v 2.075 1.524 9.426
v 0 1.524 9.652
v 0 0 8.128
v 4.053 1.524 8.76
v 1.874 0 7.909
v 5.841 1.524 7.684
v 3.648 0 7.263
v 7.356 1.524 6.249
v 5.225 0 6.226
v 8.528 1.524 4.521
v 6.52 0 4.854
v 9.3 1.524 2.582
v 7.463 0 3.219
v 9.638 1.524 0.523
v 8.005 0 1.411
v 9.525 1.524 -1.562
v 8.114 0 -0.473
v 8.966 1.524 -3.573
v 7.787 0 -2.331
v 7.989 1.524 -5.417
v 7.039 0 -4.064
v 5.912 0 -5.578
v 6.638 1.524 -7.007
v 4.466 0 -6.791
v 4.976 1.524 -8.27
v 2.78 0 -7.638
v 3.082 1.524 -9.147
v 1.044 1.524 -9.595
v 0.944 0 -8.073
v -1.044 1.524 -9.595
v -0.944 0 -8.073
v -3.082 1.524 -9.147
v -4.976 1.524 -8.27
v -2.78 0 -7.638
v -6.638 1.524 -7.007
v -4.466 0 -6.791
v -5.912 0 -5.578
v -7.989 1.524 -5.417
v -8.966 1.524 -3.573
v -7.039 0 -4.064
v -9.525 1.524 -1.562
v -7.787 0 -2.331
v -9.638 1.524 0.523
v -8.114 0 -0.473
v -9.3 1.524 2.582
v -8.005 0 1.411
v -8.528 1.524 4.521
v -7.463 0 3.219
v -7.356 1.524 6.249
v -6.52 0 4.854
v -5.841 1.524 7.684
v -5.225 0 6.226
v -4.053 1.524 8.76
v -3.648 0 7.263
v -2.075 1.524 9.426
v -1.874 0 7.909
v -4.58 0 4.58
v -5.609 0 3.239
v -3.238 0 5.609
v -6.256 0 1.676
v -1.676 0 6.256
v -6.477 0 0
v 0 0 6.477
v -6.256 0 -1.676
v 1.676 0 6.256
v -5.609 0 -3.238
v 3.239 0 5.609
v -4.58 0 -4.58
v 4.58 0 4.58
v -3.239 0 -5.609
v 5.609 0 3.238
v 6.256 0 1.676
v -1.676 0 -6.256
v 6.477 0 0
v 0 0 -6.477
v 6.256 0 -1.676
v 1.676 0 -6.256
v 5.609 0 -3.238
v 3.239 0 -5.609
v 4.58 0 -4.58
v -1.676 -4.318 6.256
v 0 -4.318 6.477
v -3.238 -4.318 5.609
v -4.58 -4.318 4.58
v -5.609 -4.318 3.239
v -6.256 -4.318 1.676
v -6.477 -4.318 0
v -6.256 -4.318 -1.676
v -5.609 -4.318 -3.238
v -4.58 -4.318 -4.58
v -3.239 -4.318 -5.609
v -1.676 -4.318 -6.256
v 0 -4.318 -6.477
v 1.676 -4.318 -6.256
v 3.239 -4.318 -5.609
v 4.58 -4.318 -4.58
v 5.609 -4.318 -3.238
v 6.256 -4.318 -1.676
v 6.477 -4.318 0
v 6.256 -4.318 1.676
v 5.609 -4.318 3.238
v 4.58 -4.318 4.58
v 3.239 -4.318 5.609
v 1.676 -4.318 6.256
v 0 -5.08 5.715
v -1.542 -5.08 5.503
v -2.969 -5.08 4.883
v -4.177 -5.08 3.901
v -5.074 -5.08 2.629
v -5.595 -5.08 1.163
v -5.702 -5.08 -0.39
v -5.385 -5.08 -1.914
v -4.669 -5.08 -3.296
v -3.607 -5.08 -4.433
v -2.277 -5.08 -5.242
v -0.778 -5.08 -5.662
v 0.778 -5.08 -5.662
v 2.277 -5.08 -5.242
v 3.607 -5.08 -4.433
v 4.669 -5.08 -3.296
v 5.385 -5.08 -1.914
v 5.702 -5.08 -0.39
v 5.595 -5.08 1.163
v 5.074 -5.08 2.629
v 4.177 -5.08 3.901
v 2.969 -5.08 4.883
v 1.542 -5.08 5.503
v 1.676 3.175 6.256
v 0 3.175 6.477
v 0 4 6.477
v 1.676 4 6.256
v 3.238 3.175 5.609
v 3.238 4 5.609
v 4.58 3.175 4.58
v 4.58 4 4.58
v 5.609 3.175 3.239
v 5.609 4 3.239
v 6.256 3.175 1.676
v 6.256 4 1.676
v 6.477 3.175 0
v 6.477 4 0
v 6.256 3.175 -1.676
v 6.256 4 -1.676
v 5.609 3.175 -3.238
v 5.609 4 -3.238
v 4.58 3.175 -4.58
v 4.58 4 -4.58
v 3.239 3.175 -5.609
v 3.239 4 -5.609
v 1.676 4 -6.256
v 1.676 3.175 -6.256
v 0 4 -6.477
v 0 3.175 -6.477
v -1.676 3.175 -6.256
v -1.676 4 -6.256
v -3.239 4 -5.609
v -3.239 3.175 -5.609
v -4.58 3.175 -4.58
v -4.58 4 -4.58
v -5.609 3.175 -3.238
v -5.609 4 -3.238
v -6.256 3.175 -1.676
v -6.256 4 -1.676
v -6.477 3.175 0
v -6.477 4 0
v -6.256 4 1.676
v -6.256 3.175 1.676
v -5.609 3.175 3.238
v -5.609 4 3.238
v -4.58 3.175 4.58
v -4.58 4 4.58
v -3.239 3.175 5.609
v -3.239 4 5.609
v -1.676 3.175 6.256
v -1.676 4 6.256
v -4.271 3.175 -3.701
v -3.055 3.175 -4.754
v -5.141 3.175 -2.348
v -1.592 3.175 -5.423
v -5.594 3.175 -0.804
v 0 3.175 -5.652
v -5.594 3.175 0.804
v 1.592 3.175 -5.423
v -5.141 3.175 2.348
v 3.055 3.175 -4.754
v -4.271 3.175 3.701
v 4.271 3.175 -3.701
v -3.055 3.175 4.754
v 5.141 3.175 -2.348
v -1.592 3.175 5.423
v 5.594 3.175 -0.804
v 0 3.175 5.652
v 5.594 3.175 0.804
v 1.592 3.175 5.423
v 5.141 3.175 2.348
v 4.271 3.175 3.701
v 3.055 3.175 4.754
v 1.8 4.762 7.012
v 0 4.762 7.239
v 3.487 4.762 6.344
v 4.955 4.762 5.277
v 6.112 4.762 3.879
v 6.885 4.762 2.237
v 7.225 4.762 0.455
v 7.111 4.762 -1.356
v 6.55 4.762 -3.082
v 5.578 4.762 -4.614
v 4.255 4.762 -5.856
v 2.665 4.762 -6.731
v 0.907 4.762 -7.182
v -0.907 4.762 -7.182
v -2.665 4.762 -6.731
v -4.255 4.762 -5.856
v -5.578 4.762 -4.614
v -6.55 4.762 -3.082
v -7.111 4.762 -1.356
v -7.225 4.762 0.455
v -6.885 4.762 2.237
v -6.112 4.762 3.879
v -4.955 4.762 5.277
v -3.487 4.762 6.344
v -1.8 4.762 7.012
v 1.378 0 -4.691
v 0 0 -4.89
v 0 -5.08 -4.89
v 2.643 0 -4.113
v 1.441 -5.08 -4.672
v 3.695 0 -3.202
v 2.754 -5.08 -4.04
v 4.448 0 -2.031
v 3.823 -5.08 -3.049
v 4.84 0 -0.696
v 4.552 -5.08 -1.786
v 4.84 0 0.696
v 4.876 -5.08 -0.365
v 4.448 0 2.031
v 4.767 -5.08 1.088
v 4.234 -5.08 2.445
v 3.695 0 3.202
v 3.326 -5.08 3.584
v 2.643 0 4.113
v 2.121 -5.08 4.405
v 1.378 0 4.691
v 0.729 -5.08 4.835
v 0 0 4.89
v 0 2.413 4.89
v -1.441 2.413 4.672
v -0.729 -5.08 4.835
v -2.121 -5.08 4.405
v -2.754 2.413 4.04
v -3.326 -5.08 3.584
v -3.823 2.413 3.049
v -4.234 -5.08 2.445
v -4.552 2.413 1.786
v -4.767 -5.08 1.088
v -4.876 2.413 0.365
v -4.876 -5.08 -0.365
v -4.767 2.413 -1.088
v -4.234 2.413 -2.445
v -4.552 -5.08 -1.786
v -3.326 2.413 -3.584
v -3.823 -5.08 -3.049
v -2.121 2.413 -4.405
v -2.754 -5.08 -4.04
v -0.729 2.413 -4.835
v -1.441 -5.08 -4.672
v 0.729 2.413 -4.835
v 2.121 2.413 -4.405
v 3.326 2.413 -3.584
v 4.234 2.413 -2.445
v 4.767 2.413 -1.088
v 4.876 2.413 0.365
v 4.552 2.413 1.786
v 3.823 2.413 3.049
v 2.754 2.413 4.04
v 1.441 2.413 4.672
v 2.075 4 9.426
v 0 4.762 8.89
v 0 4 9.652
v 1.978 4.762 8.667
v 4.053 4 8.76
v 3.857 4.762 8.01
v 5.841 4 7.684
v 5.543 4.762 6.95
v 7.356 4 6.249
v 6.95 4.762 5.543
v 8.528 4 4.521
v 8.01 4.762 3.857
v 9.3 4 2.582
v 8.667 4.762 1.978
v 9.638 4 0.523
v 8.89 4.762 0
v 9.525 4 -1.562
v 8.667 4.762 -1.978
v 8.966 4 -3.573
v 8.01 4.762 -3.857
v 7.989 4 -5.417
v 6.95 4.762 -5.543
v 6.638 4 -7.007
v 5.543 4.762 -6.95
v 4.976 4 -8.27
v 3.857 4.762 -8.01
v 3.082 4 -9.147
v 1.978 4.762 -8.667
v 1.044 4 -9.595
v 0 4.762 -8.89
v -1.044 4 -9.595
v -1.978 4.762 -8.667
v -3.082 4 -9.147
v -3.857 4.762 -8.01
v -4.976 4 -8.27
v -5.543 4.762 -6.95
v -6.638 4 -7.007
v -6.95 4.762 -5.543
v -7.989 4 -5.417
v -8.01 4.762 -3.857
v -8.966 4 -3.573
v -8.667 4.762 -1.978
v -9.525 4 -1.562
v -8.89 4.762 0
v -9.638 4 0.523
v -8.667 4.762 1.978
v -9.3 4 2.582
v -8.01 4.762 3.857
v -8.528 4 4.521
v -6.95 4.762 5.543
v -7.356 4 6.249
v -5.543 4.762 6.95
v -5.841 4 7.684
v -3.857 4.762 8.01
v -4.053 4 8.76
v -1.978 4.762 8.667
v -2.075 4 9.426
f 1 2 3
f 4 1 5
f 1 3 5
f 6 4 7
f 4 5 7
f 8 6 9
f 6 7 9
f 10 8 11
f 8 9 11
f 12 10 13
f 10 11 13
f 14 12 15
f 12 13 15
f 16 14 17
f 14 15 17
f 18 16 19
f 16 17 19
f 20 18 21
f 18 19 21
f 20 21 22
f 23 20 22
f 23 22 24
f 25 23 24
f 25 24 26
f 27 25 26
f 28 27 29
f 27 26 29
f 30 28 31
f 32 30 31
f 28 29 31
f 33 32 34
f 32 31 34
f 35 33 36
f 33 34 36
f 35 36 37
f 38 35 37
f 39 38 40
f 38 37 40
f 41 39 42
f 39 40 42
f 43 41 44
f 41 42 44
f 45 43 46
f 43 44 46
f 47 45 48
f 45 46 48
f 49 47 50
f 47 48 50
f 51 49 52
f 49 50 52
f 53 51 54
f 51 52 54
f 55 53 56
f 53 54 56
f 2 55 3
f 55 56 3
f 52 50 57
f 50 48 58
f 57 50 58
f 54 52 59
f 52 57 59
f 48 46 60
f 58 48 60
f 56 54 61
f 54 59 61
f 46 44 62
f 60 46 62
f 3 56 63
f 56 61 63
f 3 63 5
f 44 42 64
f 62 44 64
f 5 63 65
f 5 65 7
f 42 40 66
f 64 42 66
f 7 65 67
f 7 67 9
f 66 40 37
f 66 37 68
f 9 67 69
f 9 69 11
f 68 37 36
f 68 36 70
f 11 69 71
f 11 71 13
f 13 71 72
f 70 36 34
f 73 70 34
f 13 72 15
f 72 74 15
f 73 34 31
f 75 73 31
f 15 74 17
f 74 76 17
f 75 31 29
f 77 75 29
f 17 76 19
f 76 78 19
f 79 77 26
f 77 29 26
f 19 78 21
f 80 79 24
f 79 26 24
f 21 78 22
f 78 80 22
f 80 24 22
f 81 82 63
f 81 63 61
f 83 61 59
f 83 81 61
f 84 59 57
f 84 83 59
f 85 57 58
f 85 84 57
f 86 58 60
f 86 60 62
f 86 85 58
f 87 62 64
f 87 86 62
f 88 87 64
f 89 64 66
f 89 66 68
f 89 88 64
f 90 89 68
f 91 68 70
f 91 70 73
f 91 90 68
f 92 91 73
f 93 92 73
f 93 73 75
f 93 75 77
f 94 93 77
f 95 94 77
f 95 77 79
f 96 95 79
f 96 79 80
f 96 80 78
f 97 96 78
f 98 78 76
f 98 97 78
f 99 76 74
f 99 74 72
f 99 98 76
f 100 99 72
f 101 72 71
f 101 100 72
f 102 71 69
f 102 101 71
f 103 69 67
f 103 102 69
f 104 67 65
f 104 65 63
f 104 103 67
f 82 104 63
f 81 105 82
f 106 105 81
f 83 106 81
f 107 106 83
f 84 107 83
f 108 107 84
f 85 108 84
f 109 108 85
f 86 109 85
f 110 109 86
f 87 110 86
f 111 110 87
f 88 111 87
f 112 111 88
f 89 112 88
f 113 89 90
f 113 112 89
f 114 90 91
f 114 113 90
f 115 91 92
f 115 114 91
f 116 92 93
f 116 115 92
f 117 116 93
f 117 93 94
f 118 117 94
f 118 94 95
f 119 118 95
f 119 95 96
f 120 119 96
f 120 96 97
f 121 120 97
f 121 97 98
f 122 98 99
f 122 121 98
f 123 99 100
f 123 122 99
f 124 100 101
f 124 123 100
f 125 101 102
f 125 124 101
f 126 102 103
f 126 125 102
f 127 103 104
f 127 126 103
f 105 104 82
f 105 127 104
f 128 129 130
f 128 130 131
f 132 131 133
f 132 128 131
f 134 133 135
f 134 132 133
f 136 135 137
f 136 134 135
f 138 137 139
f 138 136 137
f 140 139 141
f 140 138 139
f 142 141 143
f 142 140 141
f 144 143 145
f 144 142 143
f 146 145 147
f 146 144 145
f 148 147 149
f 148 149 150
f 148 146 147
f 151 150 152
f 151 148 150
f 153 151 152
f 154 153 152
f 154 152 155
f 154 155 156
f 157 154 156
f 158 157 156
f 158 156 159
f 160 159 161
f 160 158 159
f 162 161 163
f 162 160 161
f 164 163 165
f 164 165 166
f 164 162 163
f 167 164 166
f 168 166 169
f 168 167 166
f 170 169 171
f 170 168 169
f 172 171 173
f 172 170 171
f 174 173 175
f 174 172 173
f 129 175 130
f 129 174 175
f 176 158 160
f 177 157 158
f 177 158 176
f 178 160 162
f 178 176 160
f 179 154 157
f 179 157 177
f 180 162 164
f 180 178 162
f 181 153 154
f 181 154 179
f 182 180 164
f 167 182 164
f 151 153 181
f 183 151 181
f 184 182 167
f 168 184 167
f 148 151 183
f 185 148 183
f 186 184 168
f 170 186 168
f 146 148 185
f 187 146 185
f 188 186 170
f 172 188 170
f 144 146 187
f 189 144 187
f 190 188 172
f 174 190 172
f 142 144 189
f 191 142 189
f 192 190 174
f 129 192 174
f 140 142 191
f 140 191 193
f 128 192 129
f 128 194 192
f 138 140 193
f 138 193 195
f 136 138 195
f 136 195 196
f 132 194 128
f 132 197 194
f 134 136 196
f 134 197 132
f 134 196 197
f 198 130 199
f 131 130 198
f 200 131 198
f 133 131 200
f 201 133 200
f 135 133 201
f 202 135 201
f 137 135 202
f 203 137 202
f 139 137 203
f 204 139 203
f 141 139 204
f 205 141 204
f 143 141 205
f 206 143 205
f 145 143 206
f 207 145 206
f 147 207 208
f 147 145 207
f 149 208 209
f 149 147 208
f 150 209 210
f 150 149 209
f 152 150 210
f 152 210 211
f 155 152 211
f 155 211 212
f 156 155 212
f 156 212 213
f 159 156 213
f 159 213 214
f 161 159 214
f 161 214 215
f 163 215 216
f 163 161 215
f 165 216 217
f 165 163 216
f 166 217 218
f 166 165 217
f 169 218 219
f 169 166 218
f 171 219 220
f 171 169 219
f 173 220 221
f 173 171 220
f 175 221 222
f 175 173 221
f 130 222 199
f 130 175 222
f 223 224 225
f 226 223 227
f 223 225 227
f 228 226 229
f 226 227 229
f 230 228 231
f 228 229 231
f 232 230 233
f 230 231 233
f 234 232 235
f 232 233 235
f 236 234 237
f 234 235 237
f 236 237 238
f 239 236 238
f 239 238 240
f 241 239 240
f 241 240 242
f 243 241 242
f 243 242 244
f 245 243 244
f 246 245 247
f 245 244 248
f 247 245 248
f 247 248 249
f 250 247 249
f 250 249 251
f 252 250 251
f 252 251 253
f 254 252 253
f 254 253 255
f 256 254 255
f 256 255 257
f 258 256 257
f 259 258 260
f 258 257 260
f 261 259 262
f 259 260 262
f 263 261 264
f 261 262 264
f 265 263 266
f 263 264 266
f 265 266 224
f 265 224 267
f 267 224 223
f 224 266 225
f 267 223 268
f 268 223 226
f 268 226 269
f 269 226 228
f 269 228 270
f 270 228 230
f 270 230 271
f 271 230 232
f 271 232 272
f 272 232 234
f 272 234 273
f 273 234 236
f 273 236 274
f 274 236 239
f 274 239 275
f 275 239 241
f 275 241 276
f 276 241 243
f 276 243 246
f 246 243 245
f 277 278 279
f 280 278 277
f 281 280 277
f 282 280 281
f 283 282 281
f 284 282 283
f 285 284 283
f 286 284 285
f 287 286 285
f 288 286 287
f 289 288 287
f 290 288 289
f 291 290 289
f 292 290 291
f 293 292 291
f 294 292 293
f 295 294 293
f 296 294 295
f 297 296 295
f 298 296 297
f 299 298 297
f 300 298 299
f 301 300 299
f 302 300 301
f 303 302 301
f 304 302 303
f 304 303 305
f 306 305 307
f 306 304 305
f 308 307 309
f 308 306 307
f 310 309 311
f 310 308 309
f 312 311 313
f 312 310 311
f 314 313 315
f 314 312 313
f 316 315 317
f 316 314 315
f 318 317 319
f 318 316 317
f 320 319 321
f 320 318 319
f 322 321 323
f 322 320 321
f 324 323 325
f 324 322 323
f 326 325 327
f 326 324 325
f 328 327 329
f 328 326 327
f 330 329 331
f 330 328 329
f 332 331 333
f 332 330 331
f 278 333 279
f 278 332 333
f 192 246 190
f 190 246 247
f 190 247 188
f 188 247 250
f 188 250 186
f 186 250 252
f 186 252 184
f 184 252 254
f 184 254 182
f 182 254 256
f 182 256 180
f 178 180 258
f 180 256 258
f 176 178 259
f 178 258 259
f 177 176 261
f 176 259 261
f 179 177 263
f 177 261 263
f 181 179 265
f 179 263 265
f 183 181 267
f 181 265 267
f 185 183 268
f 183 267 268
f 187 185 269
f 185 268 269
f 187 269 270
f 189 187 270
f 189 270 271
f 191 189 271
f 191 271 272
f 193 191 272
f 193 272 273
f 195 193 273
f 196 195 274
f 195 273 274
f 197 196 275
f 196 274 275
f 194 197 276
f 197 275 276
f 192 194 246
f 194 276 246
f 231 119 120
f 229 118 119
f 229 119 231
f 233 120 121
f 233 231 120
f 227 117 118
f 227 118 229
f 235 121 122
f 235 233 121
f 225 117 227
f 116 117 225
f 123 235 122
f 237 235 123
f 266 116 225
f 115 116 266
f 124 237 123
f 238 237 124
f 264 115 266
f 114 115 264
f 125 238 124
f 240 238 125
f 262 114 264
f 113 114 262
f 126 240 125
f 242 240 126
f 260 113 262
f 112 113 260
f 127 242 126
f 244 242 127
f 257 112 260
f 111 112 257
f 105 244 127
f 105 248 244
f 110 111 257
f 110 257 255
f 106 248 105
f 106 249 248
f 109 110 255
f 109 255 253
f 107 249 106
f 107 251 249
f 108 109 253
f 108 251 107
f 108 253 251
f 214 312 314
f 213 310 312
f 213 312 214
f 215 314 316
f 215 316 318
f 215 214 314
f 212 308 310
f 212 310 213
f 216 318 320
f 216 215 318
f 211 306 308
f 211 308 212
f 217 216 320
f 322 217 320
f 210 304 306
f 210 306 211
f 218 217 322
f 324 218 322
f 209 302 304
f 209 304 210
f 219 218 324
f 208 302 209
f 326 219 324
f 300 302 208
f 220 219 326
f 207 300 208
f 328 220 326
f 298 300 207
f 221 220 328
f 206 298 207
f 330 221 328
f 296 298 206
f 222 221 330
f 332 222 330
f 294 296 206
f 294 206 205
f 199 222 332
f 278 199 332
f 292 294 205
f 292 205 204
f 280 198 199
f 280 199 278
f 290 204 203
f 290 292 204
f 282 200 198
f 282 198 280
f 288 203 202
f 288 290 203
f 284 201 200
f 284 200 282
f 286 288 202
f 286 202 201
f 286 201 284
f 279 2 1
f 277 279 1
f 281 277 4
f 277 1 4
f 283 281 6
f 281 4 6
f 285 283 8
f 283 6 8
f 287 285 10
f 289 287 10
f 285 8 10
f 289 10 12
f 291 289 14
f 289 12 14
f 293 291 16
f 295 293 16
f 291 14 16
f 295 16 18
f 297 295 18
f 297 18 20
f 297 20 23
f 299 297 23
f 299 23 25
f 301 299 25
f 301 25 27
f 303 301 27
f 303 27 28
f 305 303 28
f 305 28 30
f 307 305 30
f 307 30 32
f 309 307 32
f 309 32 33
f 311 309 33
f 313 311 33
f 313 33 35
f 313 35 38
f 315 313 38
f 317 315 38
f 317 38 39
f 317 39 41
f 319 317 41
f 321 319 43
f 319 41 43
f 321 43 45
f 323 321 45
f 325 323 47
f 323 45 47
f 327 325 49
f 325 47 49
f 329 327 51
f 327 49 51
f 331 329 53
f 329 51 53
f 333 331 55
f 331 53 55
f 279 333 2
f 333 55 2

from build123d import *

# Parameters (mm, degrees)
SKETCH1_R           = 9.652
SKETCH1_R_2         = 6.477
BOSS_EXTRUDE1_DEPTH = 3.175
BOSS_EXTRUDE2_START = 3.175
SKETCH1_3_R         = 9.652
SKETCH1_3_R_2       = 6.477
BOSS_EXTRUDE2_DEPTH = 1.5875
BOSS_EXTRUDE3_START = 5.08
SKETCH2_R           = 6.477
SKETCH2_R_2         = 4.8895
BOSS_EXTRUDE3_DEPTH = 5.08
SKETCH3_R           = 4.8895
CUT_EXTRUDE1_DEPTH  = 15.564635526
CHAMFER1_SIZE       = 1.524
CHAMFER2_SIZE       = 0.762
CHAMFER3_SIZE       = 0.762


with BuildPart() as part:
    # Sketch1 → Boss-Extrude1 (new body)
    # profile 1 of 2: a face of its own
    with BuildSketch(Plane(origin=(0, 0, 0), x_dir=(1, 0, 0), z_dir=(0, 1, 0))):
        with Locations(Location((0, 0, 0), (0, 0, 270))):
            Circle(SKETCH1_R)
        Circle(SKETCH1_R_2, mode=Mode.SUBTRACT)
    # profile 2 of 2: a face of its own
    with BuildSketch(Plane(origin=(0, 0, 0), x_dir=(1, 0, 0), z_dir=(0, 1, 0))):
        Circle(SKETCH1_R_2)
    extrude(amount=BOSS_EXTRUDE1_DEPTH)

    # Sketch1<3> → Boss-Extrude2 (add)
    with BuildSketch(Plane(origin=(0, 0, 0), x_dir=(1, 0, 0), z_dir=(0, 1, 0)).offset(BOSS_EXTRUDE2_START)):
        with Locations(Location((0, 0, 0), (0, 0, 270))):
            Circle(SKETCH1_3_R)
        with Locations(Location((0, 0, 0), (0, 0, 270))):
            Circle(SKETCH1_3_R_2, mode=Mode.SUBTRACT)
    extrude(amount=BOSS_EXTRUDE2_DEPTH)

    # Sketch2 → Boss-Extrude3 (add)
    with BuildSketch(Plane.XZ.offset(BOSS_EXTRUDE3_START)):
        with Locations(Location((0, 0, 0), (0, 0, 90))):
            Circle(SKETCH2_R)
        with Locations(Location((0, 0, 0), (0, 0, 270))):
            Circle(SKETCH2_R_2, mode=Mode.SUBTRACT)
    extrude(amount=-BOSS_EXTRUDE3_DEPTH)

    # Sketch3 → Cut-Extrude1 (cut, through all)
    with BuildSketch(Plane.XZ):
        with Locations(Location((0, 0, 0), (0, 0, 90))):
            Circle(SKETCH3_R)
    extrude(amount=-CUT_EXTRUDE1_DEPTH, mode=Mode.SUBTRACT)

    # Chamfer1
    chamfer1_edges = [part.edges().sort_by_distance(p)[0] for p in [
        (0, 0, -9.652),
    ]]
    chamfer(chamfer1_edges, length=CHAMFER1_SIZE)

    # Chamfer2
    chamfer2_edges = [part.edges().sort_by_distance(p)[0] for p in [
        (0, 3.175, -4.8895),
        (0, 4.7625, -9.652),
        (0, 4.7625, -6.477),
    ]]
    chamfer(chamfer2_edges, length=CHAMFER2_SIZE)

    # Chamfer3
    chamfer3_edges = [part.edges().sort_by_distance(p)[0] for p in [
        (0, -5.08, -6.477),
    ]]
    chamfer(chamfer3_edges, length=CHAMFER3_SIZE)


solid = part.part
